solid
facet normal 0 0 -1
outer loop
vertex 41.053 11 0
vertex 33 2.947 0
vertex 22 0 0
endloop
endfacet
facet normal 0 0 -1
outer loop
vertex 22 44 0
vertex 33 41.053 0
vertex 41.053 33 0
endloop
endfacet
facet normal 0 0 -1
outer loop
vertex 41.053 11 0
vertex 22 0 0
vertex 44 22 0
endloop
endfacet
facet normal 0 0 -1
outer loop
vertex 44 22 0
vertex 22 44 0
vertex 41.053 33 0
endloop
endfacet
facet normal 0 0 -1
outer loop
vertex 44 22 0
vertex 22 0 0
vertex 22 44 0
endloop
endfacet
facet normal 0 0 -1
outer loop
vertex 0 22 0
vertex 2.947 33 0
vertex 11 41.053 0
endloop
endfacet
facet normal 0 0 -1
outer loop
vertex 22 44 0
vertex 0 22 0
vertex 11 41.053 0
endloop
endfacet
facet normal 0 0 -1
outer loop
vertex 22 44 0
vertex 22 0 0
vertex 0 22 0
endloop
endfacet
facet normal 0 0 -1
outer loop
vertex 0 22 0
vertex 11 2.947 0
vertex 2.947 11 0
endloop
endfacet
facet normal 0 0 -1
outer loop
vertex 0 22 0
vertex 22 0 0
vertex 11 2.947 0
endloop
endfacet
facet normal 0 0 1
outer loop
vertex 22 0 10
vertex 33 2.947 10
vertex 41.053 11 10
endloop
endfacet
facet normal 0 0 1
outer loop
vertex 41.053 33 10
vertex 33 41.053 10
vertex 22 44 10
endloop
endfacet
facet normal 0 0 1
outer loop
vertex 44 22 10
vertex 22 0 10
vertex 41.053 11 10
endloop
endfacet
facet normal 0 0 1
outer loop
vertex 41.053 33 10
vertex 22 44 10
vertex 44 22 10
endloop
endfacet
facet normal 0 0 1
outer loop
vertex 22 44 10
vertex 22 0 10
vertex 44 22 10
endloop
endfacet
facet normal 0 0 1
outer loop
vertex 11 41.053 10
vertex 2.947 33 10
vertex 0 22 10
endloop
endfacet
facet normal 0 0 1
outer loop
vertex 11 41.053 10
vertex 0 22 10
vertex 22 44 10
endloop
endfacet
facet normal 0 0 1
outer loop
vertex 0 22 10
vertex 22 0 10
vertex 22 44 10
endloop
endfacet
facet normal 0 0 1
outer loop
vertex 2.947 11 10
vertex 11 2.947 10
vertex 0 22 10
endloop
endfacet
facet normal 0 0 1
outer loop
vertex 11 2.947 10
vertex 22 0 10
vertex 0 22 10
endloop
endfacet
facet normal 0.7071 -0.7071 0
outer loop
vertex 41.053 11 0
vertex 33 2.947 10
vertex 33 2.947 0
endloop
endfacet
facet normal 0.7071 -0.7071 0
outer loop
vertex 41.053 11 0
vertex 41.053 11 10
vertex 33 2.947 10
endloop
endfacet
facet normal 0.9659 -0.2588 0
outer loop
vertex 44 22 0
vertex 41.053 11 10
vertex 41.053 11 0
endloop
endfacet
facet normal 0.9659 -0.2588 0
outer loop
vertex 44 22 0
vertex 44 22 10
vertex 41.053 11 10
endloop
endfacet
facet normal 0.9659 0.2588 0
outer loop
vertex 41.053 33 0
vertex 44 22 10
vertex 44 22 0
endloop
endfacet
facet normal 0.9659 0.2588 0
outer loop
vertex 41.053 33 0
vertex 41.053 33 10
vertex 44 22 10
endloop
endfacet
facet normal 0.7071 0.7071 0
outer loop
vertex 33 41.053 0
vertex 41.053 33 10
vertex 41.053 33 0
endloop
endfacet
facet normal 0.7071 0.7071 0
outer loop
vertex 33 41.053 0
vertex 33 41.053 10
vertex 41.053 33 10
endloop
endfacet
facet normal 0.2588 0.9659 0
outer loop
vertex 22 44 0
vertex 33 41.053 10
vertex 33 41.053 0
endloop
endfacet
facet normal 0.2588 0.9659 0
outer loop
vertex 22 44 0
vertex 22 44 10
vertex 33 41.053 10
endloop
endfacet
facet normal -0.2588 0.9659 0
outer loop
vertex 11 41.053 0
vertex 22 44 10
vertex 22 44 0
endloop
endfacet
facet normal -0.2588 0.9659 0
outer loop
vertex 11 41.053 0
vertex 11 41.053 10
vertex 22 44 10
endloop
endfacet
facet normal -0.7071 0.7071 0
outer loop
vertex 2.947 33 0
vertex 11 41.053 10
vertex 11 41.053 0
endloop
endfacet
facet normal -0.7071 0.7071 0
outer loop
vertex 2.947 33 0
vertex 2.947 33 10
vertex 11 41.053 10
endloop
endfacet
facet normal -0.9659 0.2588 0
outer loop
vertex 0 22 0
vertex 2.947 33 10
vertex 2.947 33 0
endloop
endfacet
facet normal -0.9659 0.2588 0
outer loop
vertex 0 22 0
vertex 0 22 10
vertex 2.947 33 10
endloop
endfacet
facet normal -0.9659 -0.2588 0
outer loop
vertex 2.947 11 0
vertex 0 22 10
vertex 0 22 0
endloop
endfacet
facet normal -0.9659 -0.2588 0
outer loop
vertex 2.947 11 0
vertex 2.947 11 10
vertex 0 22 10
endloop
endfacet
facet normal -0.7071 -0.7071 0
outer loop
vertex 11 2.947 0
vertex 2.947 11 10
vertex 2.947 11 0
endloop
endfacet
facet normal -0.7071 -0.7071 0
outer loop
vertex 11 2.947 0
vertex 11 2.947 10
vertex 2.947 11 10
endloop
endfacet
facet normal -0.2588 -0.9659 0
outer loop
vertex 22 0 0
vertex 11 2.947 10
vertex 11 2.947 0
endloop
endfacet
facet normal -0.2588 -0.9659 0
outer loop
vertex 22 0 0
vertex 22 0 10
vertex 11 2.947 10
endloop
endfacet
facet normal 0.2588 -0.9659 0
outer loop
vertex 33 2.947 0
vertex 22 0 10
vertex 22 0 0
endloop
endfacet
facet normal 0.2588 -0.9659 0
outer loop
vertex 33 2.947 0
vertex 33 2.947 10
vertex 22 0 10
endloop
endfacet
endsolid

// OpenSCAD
$fn = 32;

// ----------------------------------------------------------------------
// Flat adaptor: keyed, 10 mm thick
// ----------------------------------------------------------------------

// --- parameters (mm) ---
profile_height = 10;      // extrusion height
profile_points = 12;      // points of the closed outline

profile = [[0, 22], [2.947, 11], [11, 2.947], [22, 0], [33, 2.947], [41.053, 11], [44, 22], [41.053, 33], [33, 41.053], [22, 44], [11, 41.053], [2.947, 33]];  // single closed polygon, 12 points, counter clockwise

// --- the one profile operation ---
linear_extrude(height = profile_height) polygon(points = profile);
